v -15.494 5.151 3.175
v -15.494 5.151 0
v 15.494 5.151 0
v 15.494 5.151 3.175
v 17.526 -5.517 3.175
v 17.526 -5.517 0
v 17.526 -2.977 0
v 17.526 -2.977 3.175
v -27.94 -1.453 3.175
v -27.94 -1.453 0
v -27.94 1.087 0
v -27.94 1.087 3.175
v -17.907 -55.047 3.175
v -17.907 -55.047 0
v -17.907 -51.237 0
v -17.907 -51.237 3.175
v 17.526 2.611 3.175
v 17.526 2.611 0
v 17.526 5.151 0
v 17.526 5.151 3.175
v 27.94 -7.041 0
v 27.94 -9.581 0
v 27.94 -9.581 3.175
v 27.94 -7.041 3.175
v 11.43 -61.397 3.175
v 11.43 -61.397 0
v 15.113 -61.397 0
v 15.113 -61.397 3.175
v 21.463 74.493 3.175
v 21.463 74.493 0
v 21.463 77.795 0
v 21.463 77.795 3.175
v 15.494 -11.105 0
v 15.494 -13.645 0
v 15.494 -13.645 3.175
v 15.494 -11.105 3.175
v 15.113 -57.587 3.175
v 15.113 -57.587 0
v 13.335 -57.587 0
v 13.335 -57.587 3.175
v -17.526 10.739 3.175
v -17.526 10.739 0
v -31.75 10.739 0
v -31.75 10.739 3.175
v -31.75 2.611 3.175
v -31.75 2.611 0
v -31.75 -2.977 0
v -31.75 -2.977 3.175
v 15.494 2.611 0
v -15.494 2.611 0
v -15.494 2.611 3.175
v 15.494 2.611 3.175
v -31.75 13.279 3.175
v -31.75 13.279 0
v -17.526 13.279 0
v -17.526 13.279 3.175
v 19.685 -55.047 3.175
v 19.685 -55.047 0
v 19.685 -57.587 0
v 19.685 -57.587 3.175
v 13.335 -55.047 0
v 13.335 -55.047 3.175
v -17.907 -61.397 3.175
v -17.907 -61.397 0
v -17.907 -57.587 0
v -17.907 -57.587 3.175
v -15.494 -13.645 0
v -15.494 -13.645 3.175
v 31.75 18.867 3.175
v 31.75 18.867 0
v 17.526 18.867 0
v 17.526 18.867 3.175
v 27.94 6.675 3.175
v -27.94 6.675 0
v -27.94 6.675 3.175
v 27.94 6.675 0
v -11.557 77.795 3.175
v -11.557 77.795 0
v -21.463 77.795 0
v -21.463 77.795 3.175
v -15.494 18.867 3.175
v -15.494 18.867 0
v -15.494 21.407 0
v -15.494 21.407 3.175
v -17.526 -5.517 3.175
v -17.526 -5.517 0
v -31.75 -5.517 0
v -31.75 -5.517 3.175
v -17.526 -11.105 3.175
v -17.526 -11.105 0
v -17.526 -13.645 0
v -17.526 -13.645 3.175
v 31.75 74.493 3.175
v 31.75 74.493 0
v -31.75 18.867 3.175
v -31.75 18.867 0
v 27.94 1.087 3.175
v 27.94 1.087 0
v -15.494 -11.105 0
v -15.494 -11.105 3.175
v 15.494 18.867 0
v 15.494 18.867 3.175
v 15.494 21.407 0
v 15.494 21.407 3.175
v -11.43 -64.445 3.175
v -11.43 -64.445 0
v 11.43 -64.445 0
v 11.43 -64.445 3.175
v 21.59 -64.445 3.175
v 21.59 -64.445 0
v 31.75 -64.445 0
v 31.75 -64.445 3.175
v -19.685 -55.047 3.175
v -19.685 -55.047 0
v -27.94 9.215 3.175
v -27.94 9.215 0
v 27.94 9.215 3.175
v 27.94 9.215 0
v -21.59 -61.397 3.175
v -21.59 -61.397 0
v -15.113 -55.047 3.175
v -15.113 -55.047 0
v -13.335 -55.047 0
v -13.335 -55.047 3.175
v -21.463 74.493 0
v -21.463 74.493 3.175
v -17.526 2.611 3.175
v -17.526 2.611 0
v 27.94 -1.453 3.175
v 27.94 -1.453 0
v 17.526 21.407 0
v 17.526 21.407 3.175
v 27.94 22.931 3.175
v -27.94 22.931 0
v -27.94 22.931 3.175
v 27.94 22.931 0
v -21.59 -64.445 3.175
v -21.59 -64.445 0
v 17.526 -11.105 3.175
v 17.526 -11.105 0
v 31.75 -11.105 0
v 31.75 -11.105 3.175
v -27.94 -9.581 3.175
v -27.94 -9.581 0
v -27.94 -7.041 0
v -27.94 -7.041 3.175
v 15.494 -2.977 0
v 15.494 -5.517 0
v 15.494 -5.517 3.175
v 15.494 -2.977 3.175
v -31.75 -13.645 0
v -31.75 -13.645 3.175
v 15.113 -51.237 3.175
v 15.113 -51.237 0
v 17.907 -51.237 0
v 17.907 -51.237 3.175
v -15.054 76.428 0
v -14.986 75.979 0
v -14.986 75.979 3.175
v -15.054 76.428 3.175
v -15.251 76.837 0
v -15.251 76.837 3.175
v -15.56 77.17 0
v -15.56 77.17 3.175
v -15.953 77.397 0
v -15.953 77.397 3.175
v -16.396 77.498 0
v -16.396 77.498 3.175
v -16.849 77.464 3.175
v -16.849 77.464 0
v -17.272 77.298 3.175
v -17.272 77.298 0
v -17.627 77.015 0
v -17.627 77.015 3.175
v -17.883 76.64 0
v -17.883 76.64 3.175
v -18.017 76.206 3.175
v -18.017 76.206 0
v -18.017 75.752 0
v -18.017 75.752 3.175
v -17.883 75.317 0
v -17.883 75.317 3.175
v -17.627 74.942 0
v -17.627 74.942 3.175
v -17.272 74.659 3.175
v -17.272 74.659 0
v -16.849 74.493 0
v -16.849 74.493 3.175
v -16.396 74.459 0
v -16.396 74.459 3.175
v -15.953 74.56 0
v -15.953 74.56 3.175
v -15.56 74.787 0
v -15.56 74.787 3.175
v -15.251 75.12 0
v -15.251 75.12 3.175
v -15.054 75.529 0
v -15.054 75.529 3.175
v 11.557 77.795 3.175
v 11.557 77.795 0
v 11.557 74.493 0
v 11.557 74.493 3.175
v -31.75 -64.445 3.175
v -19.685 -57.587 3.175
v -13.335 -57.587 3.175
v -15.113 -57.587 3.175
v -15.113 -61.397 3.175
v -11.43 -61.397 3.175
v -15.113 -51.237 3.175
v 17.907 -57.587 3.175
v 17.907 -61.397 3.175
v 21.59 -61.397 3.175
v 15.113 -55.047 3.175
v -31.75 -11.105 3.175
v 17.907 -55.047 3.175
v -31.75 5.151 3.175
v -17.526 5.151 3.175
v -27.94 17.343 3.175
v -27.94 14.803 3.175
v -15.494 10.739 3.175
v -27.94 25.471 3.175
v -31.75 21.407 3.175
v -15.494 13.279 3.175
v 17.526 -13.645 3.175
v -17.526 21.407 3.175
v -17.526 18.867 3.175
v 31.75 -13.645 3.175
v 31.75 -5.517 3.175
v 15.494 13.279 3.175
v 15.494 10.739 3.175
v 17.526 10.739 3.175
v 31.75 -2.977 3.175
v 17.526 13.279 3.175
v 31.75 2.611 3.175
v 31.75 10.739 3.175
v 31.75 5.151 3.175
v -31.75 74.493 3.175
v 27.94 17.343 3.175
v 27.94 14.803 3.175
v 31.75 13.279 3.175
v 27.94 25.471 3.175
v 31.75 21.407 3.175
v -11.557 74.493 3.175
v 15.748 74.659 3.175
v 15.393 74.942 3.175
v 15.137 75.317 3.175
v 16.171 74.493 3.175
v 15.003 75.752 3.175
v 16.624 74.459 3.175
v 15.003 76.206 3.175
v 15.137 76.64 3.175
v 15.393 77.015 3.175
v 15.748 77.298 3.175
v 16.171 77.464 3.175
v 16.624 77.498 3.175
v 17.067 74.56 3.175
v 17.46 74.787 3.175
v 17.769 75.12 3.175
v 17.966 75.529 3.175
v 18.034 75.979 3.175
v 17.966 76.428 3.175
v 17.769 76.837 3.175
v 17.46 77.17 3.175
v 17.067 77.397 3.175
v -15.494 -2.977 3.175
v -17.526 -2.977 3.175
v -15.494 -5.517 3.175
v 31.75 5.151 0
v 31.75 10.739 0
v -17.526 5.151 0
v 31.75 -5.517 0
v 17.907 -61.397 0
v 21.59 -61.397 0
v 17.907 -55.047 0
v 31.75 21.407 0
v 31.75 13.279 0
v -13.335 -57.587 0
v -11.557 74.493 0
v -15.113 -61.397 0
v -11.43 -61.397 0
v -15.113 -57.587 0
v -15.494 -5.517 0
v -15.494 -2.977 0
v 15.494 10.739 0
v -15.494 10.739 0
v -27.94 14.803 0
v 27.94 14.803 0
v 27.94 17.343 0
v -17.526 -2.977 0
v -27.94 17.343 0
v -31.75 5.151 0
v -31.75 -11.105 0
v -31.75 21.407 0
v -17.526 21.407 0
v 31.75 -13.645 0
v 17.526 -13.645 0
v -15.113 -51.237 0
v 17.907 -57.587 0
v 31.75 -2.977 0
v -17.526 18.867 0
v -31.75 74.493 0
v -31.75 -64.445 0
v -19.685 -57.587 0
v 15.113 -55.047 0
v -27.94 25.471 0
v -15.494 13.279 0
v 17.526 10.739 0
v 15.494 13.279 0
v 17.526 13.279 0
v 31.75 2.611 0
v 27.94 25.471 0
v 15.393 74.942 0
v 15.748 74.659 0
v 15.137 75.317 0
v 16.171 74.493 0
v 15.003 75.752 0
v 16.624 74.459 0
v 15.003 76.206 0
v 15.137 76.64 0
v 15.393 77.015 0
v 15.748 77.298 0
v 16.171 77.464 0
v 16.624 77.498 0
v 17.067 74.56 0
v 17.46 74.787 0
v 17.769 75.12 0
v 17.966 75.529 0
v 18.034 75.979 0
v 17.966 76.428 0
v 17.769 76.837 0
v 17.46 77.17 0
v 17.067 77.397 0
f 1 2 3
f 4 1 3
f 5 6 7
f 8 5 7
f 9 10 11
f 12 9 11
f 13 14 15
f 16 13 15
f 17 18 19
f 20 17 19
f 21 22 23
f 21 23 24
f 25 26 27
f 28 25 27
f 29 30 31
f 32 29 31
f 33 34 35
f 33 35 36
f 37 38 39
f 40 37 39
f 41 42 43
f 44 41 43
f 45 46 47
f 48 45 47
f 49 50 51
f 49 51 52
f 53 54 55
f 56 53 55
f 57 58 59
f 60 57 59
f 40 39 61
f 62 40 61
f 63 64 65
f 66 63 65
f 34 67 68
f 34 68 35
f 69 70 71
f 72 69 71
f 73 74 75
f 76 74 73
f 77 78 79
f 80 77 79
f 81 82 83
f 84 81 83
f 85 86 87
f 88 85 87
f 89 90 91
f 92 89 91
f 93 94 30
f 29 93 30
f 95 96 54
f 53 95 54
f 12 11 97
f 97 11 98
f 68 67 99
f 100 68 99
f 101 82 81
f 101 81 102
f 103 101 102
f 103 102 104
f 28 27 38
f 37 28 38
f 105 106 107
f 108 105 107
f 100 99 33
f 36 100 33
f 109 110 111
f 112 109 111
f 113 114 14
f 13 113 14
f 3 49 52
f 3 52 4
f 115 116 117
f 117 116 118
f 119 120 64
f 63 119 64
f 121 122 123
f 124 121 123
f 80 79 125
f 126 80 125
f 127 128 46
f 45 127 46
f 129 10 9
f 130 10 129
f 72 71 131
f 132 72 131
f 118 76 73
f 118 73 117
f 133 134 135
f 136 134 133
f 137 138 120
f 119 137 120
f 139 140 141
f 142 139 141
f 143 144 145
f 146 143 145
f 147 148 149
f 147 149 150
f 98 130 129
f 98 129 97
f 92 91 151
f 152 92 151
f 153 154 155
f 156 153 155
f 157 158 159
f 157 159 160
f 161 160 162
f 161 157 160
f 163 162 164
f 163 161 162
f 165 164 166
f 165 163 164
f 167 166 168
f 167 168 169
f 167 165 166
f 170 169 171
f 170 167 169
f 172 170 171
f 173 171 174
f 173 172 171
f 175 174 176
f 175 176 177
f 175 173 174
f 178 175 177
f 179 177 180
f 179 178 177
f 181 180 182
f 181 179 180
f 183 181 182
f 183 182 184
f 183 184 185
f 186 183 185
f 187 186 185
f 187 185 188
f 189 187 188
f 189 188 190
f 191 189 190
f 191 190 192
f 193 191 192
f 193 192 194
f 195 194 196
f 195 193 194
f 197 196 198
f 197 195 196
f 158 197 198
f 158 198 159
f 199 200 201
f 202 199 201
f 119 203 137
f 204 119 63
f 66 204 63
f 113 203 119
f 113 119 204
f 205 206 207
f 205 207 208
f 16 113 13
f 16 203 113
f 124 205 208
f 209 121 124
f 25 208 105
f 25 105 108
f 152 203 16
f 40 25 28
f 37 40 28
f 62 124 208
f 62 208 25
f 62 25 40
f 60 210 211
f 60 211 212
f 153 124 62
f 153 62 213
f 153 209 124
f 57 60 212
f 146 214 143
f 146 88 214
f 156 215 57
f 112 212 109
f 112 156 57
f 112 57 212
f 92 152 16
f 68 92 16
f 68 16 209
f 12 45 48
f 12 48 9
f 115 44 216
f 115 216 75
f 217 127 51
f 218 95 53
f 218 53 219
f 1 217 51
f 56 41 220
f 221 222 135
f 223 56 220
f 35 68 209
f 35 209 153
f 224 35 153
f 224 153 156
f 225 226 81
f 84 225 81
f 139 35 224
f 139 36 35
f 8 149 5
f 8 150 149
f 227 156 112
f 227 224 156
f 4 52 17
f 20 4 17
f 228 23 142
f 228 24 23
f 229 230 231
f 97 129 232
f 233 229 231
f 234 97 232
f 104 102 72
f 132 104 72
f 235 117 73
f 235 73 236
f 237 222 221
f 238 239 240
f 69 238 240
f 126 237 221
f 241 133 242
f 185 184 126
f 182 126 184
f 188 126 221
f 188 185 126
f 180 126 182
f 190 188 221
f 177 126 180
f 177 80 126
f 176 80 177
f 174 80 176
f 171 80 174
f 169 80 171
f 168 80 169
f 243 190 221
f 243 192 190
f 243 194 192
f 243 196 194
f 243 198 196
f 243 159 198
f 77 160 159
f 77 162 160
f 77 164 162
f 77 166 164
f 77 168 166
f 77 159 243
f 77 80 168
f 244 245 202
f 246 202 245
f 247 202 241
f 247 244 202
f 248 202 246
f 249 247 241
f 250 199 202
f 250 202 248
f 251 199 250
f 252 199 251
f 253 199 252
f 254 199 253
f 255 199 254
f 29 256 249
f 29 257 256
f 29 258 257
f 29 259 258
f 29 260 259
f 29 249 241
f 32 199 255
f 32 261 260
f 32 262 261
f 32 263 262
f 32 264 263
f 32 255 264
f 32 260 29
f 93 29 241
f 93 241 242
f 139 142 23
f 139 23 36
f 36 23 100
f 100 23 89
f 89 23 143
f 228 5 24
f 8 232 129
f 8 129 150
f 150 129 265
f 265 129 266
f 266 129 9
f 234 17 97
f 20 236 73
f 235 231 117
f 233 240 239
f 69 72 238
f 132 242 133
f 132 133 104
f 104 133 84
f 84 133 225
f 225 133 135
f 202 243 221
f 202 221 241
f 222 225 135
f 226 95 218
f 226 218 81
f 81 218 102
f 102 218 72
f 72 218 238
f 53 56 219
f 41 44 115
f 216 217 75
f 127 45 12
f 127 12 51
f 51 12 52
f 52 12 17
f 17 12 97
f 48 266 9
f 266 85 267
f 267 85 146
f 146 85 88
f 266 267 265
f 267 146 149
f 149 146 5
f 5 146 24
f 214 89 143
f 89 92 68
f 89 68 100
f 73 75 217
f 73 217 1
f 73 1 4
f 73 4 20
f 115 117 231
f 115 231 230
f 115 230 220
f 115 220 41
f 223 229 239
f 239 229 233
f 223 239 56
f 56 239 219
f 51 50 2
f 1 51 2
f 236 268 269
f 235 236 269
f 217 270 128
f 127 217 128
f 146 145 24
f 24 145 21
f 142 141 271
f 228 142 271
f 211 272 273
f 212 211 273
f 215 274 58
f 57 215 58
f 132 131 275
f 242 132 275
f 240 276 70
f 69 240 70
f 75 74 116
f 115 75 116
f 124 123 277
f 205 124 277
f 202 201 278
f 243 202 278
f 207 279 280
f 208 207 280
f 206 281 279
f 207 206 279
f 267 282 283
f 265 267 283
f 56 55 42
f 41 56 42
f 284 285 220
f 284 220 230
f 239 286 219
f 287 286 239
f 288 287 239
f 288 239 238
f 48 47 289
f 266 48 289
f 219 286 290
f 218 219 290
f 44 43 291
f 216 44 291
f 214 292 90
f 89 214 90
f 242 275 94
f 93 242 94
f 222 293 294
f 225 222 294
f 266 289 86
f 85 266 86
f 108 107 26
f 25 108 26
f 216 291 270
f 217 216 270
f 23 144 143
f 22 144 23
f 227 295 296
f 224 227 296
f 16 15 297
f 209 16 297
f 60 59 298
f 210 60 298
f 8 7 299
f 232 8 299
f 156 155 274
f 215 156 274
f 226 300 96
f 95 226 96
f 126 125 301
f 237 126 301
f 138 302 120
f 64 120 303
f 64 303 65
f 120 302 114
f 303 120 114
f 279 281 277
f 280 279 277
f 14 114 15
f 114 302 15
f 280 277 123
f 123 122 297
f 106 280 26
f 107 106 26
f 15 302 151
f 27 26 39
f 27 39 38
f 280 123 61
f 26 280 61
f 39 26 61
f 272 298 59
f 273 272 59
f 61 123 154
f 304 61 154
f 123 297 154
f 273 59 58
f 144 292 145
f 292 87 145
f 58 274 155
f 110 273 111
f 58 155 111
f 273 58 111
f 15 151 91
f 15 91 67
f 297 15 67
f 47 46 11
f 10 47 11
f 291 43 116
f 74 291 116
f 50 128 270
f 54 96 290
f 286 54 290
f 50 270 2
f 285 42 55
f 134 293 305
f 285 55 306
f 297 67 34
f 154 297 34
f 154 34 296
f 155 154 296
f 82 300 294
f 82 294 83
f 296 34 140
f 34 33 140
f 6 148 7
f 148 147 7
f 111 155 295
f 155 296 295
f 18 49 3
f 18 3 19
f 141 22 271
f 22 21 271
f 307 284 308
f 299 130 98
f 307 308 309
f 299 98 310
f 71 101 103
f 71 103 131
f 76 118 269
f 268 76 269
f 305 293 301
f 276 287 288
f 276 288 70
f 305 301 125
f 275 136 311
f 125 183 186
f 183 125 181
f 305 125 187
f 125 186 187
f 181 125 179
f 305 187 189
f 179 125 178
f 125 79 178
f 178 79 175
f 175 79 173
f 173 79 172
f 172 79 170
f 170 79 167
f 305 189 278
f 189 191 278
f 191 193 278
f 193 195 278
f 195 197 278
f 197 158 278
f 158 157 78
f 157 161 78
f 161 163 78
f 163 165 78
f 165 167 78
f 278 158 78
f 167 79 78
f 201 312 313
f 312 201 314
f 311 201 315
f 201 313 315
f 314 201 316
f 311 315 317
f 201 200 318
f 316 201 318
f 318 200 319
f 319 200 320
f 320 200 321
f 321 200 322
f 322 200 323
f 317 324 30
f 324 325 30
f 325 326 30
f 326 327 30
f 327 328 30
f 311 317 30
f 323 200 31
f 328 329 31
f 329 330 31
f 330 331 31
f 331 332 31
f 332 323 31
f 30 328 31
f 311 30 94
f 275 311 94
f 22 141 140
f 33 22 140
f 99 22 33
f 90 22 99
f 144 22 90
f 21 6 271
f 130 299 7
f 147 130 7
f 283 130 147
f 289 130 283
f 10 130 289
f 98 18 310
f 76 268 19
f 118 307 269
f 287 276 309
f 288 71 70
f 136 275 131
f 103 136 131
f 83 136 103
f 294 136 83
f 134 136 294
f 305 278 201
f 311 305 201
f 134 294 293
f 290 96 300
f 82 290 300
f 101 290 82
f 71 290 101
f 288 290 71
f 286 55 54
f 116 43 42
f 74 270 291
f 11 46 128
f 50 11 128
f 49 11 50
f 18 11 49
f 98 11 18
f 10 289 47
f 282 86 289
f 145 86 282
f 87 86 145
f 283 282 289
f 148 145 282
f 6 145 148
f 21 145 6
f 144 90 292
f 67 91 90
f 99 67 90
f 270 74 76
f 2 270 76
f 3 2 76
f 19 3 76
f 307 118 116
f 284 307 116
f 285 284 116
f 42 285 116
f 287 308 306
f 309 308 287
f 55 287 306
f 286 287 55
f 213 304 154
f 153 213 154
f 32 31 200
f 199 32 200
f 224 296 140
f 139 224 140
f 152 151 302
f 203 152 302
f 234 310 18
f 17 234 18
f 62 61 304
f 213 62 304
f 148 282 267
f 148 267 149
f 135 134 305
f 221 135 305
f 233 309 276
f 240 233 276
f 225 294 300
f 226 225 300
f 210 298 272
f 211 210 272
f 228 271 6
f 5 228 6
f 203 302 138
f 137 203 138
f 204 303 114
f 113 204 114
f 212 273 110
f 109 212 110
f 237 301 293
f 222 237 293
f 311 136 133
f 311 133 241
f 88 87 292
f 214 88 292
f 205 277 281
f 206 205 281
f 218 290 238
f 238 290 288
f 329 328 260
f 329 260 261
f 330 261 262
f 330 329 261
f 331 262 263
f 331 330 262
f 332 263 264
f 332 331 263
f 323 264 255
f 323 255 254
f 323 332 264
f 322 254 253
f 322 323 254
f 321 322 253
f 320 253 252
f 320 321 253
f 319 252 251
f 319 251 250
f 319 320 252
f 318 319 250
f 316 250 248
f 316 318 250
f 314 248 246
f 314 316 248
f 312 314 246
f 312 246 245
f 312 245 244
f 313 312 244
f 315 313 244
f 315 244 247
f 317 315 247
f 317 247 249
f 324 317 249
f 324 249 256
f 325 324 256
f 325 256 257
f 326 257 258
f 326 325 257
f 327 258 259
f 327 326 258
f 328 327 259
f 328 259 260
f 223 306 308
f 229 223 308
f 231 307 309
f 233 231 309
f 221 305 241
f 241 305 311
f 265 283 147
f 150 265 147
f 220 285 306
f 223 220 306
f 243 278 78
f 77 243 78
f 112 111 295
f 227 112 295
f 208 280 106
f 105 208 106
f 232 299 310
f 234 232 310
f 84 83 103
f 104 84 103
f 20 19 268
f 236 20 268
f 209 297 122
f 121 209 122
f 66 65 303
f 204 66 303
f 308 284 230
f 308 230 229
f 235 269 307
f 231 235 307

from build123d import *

# Parameters (mm, degrees)
F0_W     = 30.988
F0_H     = 2.54
F0_W_2   = 55.88
F0_R     = 1.524
F1_DEPTH = 3.175


# Not quite as in the source:
# - a length typed as a fraction of an inch, garbled in the dataset ("3 / 203.2 mm" for 3/8 in), is restored
# - a feature names something its author has since deleted; it is built from what else it names


with BuildPart() as f1:
    # F0 (on Top) → F1 (new body)
    with BuildSketch(Plane.XY):
        Polygon((21.59, -64.4452290503), (31.75, -64.4452290503), (31.75, -13.6452290503), (17.526, -13.6452290503), (17.526, -11.1052290503), (31.75, -11.1052290503), (31.75, -5.5172290503), (17.526, -5.5172290503), (17.526, -2.9772290503), (31.75, -2.9772290503), (31.75, 2.6107709497), (17.526, 2.6107709497), (17.526, 5.1507709497), (31.75, 5.1507709497), (31.75, 10.7387709497), (17.526, 10.7387709497), (17.526, 13.2787709497), (31.75, 13.2787709497), (31.75, 18.8667709497), (17.526, 18.8667709497), (17.526, 21.4067709497), (31.75, 21.4067709497), (31.75, 26.9947709497), (-31.75, 26.9947709497), (-31.75, 21.4067709497), (-17.526, 21.4067709497), (-17.526, 18.8667709497), (-31.75, 18.8667709497), (-31.75, 13.2787709497), (-17.526, 13.2787709497), (-17.526, 10.7387709497), (-31.75, 10.7387709497), (-31.75, 5.1507709497), (-17.526, 5.1507709497), (-17.526, 2.6107709497), (-31.75, 2.6107709497), (-31.75, -2.9772290503), (-17.526, -2.9772290503), (-17.526, -5.5172290503), (-31.75, -5.5172290503), (-31.75, -11.1052290503), (-17.526, -11.1052290503), (-17.526, -13.6452290503), (-31.75, -13.6452290503), (-31.75, -64.4452290503), (-21.59, -64.4452290503), (-21.59, -61.3972290503), (-17.907, -61.3972290503), (-17.907, -57.5872290503), (-19.685, -57.5872290503), (-19.685, -55.0472290503), (-17.907, -55.0472290503), (-17.907, -51.2372290503), (-15.113, -51.2372290503), (-15.113, -55.0472290503), (-13.335, -55.0472290503), (-13.335, -57.5872290503), (-15.113, -57.5872290503), (-15.113, -61.3972290503), (-11.43, -61.3972290503), (-11.43, -64.4452290503), (11.43, -64.4452290503), (11.43, -61.3972290503), (15.113, -61.3972290503), (15.113, -57.5872290503), (13.335, -57.5872290503), (13.335, -55.0472290503), (15.113, -55.0472290503), (15.113, -51.2372290503), (17.907, -51.2372290503), (17.907, -55.0472290503), (19.685, -55.0472290503), (19.685, -57.5872290503), (17.907, -57.5872290503), (17.907, -61.3972290503), (21.59, -61.3972290503), align=None)
        with Locations((0, -12.3752290503)):
            Rectangle(F0_W, F0_H, mode=Mode.SUBTRACT)
        with Locations((0, -8.3112290503)):
            Rectangle(F0_W_2, F0_H, mode=Mode.SUBTRACT)
        with Locations((0, -4.2472290503)):
            Rectangle(F0_W, F0_H, mode=Mode.SUBTRACT)
        with Locations((0, -0.1832290503)):
            Rectangle(F0_W_2, F0_H, mode=Mode.SUBTRACT)
        with Locations((0, 3.8807709497)):
            Rectangle(F0_W, F0_H, mode=Mode.SUBTRACT)
        with Locations((0, 7.9447709497)):
            Rectangle(F0_W_2, F0_H, mode=Mode.SUBTRACT)
        with Locations((0, 12.0087709497)):
            Rectangle(F0_W, F0_H, mode=Mode.SUBTRACT)
        with Locations((0, 16.0727709497)):
            Rectangle(F0_W_2, F0_H, mode=Mode.SUBTRACT)
        with Locations((0, 20.1367709497)):
            Rectangle(F0_W, F0_H, mode=Mode.SUBTRACT)
        with Locations((0, 24.2007709497)):
            Rectangle(F0_W_2, F0_H, mode=Mode.SUBTRACT)
        Polygon((-31.75, 26.9947709497), (31.75, 26.9947709497), (31.75, 74.4927709497), (21.463, 74.4927709497), (21.463, 77.7947709497), (11.557, 77.7947709497), (11.557, 74.4927709497), (-11.557, 74.4927709497), (-11.557, 77.7947709497), (-21.463, 77.7947709497), (-21.463, 74.4927709497), (-31.75, 74.4927709497), align=None)
        with Locations((-16.51, 75.9786709497)):
            Circle(F0_R, mode=Mode.SUBTRACT)
        with Locations((16.51, 75.9786709497)):
            Circle(F0_R, mode=Mode.SUBTRACT)
    extrude(amount=F1_DEPTH)


solid = f1.part
